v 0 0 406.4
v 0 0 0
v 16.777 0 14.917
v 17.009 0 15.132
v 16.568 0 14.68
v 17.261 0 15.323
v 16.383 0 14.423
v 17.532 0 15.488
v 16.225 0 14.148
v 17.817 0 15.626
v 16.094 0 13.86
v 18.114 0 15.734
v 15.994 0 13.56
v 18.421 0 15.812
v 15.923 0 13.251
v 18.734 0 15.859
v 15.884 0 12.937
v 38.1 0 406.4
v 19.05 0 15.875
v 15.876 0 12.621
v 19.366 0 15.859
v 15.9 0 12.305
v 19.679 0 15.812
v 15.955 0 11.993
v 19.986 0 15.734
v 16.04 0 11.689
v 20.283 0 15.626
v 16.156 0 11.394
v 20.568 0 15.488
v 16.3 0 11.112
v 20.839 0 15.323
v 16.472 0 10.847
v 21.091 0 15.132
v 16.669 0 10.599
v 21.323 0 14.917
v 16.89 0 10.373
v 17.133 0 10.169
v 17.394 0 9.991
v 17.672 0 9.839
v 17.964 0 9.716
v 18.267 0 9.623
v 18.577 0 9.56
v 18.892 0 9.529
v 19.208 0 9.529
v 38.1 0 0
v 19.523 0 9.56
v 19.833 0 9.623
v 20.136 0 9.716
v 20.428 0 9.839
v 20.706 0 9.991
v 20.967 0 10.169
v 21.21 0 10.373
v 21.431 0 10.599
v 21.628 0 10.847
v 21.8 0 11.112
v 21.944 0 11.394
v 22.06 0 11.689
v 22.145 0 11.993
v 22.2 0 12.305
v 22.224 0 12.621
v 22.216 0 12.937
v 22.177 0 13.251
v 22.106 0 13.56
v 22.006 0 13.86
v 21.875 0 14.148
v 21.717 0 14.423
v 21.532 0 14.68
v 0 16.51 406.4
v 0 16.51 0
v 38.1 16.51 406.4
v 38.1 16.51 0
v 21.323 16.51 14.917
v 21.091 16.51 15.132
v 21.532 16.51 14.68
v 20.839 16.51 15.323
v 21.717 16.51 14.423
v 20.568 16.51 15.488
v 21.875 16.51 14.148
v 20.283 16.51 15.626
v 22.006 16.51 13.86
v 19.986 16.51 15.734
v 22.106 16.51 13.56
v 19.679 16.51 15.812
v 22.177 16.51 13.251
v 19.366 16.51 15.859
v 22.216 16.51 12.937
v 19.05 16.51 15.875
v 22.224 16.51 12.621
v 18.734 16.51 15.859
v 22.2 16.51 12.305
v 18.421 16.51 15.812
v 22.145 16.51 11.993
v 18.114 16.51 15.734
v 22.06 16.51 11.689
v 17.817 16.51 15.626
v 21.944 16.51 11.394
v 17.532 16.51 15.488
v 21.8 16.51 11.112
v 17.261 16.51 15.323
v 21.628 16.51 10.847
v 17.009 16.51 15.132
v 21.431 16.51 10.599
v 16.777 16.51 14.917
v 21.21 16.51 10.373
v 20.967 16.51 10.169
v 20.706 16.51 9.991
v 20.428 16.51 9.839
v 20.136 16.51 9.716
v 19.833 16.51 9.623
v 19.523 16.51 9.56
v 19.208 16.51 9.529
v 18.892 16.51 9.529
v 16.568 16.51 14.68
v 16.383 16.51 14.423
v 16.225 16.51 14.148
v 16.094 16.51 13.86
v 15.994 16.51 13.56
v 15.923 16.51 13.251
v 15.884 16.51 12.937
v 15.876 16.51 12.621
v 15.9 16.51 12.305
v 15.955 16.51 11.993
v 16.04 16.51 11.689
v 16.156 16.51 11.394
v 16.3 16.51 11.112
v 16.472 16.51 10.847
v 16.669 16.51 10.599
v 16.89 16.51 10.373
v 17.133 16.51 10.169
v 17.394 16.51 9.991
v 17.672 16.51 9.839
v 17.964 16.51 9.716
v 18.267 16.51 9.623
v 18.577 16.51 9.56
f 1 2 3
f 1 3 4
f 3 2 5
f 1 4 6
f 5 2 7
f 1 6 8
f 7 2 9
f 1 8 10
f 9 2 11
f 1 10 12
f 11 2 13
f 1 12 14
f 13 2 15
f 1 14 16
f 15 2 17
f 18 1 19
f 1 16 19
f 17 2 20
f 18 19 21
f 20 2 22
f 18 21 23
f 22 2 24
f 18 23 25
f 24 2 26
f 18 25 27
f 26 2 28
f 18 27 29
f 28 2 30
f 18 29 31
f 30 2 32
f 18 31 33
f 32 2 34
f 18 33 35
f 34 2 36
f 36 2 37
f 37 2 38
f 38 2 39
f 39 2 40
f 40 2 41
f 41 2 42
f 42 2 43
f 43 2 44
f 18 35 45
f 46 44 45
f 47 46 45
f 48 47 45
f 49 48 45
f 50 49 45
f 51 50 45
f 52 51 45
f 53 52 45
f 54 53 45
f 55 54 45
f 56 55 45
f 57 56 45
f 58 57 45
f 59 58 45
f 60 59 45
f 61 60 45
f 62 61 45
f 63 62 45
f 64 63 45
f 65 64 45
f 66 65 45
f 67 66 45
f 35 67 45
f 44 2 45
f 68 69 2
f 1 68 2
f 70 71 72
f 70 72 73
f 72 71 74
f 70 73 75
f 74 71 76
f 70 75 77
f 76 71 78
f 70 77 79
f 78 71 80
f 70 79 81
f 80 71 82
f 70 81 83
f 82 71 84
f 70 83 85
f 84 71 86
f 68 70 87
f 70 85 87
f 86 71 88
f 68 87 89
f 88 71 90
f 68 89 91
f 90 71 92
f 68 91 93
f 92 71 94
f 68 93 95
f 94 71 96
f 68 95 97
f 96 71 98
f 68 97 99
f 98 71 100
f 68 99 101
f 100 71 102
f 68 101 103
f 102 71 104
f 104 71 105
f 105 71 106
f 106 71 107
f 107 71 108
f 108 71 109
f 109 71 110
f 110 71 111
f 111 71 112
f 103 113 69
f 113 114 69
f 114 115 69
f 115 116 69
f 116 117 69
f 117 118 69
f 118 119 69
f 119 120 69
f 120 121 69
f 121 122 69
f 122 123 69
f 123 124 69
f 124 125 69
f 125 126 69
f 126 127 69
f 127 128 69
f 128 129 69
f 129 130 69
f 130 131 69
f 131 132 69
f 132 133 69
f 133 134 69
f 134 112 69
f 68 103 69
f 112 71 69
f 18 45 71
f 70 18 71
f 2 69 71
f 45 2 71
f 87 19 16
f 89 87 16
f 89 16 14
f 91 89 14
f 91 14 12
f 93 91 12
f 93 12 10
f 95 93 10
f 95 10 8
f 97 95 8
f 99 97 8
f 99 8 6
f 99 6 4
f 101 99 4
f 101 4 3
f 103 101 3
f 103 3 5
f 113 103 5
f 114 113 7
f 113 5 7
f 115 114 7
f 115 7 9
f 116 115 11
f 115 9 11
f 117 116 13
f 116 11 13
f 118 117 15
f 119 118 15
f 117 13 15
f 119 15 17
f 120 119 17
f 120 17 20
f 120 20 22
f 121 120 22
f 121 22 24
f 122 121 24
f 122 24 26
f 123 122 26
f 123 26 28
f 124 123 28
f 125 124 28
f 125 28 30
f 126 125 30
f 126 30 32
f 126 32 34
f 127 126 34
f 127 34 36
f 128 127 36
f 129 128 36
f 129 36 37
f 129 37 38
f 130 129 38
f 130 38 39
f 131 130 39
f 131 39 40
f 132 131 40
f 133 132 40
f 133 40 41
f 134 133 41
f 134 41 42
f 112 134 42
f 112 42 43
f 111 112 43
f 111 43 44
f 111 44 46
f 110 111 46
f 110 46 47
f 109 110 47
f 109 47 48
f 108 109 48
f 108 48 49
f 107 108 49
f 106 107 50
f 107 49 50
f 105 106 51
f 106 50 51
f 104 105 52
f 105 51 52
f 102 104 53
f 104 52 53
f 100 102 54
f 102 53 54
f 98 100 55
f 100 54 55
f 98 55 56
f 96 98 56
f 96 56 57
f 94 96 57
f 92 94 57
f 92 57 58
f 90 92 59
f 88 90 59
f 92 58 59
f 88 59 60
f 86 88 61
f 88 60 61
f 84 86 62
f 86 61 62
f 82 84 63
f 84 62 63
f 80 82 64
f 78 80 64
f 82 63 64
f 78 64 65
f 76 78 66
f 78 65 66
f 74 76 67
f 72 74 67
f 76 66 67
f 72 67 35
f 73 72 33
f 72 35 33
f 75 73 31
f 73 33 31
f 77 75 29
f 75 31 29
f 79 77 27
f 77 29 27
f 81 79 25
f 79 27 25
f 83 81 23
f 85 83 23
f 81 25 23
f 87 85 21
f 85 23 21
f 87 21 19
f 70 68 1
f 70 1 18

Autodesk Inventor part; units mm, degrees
ref_plane "YZ Plane" through (0, 0, 0) normal (1, 0, 0) x (0, 1, 0)
ref_plane "XZ Plane" through (0, 0, 0) normal (0, 1, 0) x (-1, 0, 0)
ref_plane "XY Plane" through (0, 0, 0) normal (0, 0, 1) x (1, 0, 0)
sketch "Sketch1" plane through (0, 0, 0) normal (0, 0, 1) x (1, 0, 0)
  line L0 (0, 0) -> (38.1, 0)
  line L1 (38.1, 0) -> (38.1, 16.51)
  line L2 (38.1, 16.51) -> (0, 16.51)
  line L3 (0, 16.51) -> (0, 0)
  dimension "d0" = 38.1
  dimension "d1" = 16.51
extrude "Extrusion1" add sketch "Sketch1" along normal blind 406.4
sketch "Sketch3" plane through (0, 16.51, 0) normal (0, 1, 0) x (1, 0, 0)
  circle A0 centre (19.05, -12.7) radius 3.175
  line L0 (38.1, 0) -> (0, 0) projected
  dimension "d11" = 6.35
  dimension "d19" = 12.7
hole "Hole2" at (19.05, 16.51, 12.7) direction (0, -1, 0) diameter 6.35 end through all
properties part number "splashFurring" material "Wood (Cherry)"
